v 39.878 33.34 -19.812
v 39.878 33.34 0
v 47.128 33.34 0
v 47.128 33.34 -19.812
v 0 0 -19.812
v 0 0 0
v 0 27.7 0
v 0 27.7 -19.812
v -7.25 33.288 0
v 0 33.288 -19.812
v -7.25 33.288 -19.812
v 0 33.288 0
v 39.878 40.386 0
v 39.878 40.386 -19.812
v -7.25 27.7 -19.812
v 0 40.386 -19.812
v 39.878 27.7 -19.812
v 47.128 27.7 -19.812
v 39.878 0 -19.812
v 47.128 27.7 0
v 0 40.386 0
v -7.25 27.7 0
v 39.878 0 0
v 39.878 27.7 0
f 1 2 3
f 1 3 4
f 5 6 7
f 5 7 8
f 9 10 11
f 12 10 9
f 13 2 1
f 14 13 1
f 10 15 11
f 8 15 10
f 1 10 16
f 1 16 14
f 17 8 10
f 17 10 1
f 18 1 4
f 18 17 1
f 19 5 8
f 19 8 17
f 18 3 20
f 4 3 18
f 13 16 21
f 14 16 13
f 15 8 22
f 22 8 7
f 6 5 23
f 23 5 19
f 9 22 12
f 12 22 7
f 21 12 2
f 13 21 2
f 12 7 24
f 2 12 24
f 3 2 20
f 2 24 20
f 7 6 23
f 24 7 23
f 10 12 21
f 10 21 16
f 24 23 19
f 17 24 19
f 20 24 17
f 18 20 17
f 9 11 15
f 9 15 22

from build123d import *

# Parameters (mm, degrees)
SKETCH2_W           = 39.878
SKETCH2_H           = 19.812
BOSS_EXTRUDE1_DEPTH = 40.386
SKETCH3_W           = 19.812
SKETCH3_H           = 5.640095975
BOSS_EXTRUDE2_DEPTH = 7.25
SKETCH4_W           = 19.812
SKETCH4_H           = 5.588
BOSS_EXTRUDE3_DEPTH = 7.25


with BuildPart() as part:
    # Sketch2 → Boss-Extrude1 (new body)
    with BuildSketch(Plane(origin=(0, 0, 0), x_dir=(1, 0, 0), z_dir=(0, 1, 0))):
        with Locations((19.939, 9.906)):
            Rectangle(SKETCH2_W, SKETCH2_H)
    extrude(amount=BOSS_EXTRUDE1_DEPTH)

    # Sketch3 → Boss-Extrude2 (add)
    with BuildSketch(Plane(origin=(39.878, 0, 0), x_dir=(0, 0, -1), z_dir=(1, 0, 0))):
        with Locations((9.906, 30.520047988)):
            Rectangle(SKETCH3_W, SKETCH3_H)
    extrude(amount=BOSS_EXTRUDE2_DEPTH)

    # Sketch4 → Boss-Extrude3 (add)
    with BuildSketch(Plane.ZY):
        with Locations((-9.906, 30.494)):
            Rectangle(SKETCH4_W, SKETCH4_H)
    extrude(amount=BOSS_EXTRUDE3_DEPTH)


solid = part.part
